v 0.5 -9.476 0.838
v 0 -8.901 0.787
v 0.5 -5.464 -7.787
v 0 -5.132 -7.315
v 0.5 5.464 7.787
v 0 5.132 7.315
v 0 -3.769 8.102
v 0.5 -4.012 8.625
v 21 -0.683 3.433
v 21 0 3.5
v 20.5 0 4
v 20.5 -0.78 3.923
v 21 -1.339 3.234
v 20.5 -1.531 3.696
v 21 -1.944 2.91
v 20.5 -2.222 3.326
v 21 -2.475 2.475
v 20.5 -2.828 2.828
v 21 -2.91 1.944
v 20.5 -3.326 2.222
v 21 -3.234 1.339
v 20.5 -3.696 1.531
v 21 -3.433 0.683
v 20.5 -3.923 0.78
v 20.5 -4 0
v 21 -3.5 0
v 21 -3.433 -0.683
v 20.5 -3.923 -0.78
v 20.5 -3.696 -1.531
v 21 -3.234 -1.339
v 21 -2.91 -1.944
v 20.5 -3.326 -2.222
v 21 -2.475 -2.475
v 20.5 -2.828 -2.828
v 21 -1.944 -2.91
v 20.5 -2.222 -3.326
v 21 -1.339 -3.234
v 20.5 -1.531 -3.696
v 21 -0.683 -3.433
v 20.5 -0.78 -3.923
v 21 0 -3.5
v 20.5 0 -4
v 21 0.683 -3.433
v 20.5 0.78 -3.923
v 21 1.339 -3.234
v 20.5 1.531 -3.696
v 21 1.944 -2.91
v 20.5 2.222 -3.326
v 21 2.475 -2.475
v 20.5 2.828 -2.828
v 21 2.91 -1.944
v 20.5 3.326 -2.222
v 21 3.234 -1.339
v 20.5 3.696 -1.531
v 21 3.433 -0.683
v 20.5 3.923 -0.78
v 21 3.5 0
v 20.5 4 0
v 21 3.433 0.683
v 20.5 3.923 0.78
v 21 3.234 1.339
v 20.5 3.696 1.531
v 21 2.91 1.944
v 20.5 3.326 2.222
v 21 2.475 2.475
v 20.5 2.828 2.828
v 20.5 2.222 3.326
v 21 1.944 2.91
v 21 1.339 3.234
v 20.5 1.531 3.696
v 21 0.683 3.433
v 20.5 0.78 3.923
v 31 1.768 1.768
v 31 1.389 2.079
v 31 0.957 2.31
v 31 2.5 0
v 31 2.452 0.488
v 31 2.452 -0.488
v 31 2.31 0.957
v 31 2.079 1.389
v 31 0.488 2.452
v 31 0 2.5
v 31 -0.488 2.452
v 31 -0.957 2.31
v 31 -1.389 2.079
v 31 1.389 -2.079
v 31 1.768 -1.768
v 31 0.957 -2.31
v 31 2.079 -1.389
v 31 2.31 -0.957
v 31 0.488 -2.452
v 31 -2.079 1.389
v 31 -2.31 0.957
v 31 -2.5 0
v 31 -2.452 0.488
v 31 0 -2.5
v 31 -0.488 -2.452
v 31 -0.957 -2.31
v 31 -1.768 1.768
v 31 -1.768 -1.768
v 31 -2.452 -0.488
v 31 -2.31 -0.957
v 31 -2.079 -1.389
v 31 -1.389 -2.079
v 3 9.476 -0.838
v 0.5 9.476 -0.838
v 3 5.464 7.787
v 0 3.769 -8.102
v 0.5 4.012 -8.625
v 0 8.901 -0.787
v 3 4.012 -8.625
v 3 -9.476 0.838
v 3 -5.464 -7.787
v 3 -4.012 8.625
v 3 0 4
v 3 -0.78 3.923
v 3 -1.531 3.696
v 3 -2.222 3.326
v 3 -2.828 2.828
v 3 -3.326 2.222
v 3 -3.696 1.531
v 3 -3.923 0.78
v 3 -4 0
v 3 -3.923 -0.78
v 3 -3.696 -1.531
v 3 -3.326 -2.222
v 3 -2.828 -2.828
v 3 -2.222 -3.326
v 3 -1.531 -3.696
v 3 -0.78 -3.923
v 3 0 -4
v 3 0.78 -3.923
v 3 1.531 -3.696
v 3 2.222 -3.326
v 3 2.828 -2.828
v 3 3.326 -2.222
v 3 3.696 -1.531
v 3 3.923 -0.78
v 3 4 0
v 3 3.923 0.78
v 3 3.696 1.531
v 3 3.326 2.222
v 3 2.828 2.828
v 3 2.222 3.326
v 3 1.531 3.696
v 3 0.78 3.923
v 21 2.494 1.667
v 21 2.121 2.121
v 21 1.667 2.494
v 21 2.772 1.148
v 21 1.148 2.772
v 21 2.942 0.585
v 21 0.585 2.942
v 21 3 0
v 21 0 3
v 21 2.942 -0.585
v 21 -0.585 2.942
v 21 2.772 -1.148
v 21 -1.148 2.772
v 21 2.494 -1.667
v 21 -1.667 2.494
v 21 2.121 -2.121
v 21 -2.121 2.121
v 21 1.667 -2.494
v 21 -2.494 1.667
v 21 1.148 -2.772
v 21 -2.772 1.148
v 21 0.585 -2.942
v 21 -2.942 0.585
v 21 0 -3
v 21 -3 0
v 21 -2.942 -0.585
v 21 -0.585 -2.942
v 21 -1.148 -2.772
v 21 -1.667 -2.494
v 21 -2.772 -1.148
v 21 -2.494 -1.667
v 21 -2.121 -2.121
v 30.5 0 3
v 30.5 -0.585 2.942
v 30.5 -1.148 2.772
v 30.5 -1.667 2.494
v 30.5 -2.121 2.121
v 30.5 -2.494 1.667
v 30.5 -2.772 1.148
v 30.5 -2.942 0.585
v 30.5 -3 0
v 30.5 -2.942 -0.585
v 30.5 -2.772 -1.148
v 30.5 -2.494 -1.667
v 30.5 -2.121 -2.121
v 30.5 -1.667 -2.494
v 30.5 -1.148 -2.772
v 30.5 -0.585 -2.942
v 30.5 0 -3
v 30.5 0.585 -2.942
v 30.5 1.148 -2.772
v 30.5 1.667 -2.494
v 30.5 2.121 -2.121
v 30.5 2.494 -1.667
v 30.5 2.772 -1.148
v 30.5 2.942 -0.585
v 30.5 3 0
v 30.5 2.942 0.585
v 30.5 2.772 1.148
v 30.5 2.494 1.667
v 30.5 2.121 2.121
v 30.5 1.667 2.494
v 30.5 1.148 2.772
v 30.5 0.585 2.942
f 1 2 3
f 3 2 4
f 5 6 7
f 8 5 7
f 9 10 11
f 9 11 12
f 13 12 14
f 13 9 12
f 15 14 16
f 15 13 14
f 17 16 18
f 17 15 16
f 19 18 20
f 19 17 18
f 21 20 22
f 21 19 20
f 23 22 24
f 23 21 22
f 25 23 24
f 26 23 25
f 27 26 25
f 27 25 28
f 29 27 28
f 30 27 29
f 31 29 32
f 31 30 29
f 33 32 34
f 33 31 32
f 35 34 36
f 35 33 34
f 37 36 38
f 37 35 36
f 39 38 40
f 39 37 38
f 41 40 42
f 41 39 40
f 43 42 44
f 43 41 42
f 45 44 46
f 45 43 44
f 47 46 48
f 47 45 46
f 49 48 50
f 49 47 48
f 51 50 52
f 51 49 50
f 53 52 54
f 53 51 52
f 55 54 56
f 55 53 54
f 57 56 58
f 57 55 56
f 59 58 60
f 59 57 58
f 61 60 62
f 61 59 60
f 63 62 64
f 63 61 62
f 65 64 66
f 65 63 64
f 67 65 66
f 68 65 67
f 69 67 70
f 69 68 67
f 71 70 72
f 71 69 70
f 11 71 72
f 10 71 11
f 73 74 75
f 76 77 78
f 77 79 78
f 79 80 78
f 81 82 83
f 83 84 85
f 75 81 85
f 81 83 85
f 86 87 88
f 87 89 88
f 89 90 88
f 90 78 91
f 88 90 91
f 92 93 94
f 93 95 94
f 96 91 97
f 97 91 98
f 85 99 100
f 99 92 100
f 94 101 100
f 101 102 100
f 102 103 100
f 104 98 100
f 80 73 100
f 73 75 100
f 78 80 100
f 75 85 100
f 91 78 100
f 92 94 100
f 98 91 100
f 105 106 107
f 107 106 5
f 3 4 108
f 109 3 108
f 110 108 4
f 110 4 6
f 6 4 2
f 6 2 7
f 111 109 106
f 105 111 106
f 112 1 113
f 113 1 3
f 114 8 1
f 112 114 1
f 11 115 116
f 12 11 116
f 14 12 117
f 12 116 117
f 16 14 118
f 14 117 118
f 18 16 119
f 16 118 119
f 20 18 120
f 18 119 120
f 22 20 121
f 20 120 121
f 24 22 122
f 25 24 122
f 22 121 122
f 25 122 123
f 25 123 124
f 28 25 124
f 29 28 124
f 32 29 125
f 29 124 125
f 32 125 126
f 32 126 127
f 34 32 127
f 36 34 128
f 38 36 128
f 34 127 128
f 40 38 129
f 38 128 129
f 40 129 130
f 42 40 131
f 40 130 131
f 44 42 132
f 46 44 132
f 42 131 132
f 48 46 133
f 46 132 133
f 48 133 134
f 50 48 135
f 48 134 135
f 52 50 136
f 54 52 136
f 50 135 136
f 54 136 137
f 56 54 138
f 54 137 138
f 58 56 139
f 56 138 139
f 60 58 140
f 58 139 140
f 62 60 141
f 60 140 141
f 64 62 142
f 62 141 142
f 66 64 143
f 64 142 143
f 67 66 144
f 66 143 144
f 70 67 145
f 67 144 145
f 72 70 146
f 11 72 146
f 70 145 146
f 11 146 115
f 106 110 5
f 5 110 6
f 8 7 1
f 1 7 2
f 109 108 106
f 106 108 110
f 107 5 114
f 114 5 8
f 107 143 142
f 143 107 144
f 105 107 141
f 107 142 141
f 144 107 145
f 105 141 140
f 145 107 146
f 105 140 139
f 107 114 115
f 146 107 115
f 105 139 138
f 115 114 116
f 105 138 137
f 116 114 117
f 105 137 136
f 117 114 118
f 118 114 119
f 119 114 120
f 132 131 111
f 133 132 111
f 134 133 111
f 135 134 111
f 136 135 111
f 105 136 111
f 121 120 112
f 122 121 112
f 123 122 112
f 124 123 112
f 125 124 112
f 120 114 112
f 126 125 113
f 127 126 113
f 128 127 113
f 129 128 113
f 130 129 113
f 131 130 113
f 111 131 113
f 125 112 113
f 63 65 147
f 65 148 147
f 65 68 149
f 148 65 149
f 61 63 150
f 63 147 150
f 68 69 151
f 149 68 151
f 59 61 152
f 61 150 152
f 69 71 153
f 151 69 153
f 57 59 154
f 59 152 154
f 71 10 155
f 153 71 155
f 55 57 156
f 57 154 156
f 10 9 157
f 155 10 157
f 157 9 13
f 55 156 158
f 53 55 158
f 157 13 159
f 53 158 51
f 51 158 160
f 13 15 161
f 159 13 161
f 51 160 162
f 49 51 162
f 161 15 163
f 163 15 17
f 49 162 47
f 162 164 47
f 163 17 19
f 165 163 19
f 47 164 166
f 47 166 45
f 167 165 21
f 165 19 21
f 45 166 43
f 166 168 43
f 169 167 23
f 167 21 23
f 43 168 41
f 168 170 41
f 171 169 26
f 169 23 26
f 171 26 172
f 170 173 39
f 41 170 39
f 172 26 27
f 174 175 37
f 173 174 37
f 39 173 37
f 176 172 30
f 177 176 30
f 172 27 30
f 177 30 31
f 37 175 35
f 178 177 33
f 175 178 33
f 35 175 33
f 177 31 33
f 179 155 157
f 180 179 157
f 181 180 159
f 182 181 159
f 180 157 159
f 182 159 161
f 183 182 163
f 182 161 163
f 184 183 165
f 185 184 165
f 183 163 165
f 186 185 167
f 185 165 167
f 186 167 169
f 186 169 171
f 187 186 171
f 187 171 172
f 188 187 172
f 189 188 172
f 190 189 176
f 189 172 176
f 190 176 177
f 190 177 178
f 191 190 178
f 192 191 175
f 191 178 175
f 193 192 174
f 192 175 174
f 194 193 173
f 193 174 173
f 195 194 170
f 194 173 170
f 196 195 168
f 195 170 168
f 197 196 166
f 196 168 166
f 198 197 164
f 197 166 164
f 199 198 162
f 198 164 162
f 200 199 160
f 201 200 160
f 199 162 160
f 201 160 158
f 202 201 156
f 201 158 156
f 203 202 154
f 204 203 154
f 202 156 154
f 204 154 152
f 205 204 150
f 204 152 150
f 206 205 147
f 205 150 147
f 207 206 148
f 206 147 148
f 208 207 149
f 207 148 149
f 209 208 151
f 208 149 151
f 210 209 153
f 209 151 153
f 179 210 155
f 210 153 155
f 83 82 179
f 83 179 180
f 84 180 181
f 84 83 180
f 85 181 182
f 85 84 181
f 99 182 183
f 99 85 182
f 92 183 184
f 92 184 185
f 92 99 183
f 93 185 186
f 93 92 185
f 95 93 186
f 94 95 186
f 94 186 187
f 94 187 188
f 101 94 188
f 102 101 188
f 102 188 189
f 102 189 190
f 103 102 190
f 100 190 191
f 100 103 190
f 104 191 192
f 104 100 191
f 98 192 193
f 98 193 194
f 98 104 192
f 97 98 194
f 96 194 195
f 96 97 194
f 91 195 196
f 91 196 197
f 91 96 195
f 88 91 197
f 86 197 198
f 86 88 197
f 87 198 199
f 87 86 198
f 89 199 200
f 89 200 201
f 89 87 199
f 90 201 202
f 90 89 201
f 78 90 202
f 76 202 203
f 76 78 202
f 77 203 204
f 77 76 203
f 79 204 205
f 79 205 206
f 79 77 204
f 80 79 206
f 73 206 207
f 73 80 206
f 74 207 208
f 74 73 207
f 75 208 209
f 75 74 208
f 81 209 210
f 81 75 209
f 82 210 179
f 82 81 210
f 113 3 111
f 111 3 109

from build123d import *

# Parameters (mm, degrees)
F2_R     = 11.382986
F3_DEPTH = 25
F4_SIZE  = 0.5
F5_SIZE  = 0.5
F6_SIZE  = 0.5


with BuildPart() as f1:
    # F0 (on Front) → F1 (revolve)
    with BuildSketch(Plane.XZ):
        Polygon((0, 10), (0, 0), (31, 0), (31, 3), (21, 3), (21, 4), (3, 4), (3, 10), align=None)
    revolve(axis=Axis((15.5, 0, 0), (1, 0, 0)))

    # F2 (on face) → F3 (cut)
    with BuildSketch(Plane(origin=(0, 0, 0), x_dir=(0, -1, 0), z_dir=(-1, 0, 0))):
        Circle(F2_R)
        Polygon((-5.463653, 7.787273), (4.01215, 8.625299), (9.475803, 0.838026), (5.463653, -7.787273), (-4.01215, -8.625299), (-9.475803, -0.838026), align=None, mode=Mode.SUBTRACT)
    extrude(amount=-F3_DEPTH, mode=Mode.SUBTRACT)

    # F4
    f4_edges = [f1.edges().sort_by_distance(p)[0] for p in [
        (21, 0, -4),
    ]]
    chamfer(f4_edges, length=F4_SIZE)

    # F5
    f5_edges = [f1.edges().sort_by_distance(p)[0] for p in [
        (31, 0, -3),
    ]]
    chamfer(f5_edges, length=F5_SIZE)

    # F6
    f6_edges = [f1.edges().sort_by_distance(p)[0] for p in [
        (0, 6.743976, -4.731663),
        (0, -0.725752, -8.206286),
        (0, -7.469728, -3.474624),
        (0, -6.743976, 4.731663),
        (0, 0.725752, 8.206286),
        (0, 7.469728, 3.474624),
    ]]
    chamfer(f6_edges, length=F6_SIZE)


solid = f1.part
